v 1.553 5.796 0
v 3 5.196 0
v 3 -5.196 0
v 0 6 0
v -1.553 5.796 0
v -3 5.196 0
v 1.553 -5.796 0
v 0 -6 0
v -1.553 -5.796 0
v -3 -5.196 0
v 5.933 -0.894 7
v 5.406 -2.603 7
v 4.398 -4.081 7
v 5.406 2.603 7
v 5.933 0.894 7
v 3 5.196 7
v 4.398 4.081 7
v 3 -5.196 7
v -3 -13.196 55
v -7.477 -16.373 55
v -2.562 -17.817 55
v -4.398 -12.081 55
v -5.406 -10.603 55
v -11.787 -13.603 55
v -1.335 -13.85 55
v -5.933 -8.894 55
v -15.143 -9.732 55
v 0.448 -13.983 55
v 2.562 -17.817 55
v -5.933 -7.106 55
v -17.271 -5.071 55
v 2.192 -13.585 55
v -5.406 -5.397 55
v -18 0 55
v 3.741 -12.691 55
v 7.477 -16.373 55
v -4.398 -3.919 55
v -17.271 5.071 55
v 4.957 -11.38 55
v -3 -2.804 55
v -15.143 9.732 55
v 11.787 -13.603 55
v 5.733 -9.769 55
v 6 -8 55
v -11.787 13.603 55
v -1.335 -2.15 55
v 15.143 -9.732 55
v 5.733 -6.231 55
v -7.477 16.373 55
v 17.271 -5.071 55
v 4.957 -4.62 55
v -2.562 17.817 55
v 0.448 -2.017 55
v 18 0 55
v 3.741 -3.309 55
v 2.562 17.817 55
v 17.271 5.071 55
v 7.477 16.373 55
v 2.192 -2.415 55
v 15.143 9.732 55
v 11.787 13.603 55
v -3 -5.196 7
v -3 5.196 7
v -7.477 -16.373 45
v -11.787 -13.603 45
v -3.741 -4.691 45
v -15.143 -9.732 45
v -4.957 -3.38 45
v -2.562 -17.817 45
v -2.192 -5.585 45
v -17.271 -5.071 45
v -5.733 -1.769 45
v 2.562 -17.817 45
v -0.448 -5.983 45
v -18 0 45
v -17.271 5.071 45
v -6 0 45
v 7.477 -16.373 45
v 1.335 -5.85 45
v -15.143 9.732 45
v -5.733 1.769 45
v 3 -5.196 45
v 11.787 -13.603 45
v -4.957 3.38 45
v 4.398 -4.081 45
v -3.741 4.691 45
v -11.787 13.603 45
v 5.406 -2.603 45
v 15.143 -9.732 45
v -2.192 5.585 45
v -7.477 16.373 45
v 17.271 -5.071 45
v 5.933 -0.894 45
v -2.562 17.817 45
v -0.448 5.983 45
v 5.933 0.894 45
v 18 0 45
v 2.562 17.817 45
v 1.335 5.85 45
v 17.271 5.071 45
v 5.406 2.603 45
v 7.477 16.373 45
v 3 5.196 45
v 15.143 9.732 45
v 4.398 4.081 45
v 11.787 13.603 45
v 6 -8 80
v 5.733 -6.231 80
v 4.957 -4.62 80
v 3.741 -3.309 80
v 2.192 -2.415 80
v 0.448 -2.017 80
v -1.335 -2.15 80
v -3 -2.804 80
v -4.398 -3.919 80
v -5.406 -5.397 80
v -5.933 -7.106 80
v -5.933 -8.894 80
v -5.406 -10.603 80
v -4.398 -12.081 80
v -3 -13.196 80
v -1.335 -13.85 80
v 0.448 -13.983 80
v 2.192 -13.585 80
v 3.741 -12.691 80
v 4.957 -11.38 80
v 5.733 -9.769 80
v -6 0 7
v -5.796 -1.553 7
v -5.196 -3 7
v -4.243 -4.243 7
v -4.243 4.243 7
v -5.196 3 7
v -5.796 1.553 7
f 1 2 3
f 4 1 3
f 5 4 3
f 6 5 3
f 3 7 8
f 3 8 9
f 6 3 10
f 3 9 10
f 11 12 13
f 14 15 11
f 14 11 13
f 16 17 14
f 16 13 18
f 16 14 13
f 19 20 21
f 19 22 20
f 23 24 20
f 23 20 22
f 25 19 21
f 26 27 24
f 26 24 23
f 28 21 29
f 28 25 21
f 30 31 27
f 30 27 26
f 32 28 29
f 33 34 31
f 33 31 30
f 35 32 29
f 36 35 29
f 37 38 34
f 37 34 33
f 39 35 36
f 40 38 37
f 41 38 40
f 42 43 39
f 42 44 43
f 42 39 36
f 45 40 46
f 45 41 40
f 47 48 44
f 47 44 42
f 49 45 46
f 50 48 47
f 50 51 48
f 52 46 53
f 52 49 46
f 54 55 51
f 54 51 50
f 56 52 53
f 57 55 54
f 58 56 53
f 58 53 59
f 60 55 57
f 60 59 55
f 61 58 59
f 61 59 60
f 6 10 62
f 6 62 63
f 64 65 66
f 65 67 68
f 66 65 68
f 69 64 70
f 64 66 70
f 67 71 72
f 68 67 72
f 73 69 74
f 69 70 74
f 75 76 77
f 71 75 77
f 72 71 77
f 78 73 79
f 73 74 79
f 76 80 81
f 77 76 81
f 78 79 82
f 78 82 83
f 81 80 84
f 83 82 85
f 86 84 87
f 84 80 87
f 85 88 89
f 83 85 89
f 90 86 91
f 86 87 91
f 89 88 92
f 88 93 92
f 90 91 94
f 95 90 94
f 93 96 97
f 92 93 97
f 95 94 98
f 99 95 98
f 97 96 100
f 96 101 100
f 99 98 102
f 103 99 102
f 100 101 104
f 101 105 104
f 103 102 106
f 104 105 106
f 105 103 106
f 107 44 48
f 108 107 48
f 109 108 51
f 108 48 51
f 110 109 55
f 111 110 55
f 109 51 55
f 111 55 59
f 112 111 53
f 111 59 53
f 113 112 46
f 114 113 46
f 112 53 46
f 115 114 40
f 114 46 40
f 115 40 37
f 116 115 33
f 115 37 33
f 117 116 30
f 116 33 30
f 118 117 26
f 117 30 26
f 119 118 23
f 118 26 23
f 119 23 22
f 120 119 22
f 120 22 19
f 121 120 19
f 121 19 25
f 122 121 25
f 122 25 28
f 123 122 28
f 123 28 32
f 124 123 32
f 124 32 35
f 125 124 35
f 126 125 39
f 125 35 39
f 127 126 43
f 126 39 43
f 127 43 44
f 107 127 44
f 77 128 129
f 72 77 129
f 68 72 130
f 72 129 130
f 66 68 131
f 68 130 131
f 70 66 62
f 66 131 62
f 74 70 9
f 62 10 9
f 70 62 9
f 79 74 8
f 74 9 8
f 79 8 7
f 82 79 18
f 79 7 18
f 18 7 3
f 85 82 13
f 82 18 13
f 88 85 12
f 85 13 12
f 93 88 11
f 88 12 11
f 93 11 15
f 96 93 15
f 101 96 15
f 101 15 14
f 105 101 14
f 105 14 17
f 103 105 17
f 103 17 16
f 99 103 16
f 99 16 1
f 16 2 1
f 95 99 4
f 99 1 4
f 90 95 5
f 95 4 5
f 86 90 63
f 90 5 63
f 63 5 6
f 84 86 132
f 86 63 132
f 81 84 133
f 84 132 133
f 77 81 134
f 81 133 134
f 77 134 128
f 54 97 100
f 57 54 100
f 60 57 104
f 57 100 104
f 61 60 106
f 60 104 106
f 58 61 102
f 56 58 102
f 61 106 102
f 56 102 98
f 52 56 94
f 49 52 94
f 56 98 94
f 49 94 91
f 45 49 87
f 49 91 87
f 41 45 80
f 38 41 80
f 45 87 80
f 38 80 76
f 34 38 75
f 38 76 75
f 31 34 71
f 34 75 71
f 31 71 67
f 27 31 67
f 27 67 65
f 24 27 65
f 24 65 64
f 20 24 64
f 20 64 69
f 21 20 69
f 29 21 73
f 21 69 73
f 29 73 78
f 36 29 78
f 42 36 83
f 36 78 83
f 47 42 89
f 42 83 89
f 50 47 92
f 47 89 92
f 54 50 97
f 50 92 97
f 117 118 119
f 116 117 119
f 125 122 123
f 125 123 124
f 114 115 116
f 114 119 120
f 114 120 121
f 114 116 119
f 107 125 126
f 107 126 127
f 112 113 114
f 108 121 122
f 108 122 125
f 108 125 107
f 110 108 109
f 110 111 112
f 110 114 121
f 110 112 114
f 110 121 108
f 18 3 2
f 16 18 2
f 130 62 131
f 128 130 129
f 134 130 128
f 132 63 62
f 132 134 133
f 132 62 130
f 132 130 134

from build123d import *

# Parameters (mm, degrees)
ESBO_O1_R                = 6
RESSALTO_EXTRUS_O1_DEPTH = 45
ESBO_O2_R                = 18
RESSALTO_EXTRUS_O2_DEPTH = 10
ESBO_O3_R                = 6
RESSALTO_EXTRUS_O3_DEPTH = 25
ESBO_O4_W                = 4.529625907
ESBO_O4_H                = 11.468627296
ESBO_O4_W_2              = 6.059251814
ESBO_O4_H_2              = 15.612753126
CORTE_EXTRUS_O1_DEPTH    = 7


with BuildPart() as part:
    # Esboço1 → Ressalto-extrusão1 (new body)
    with BuildSketch(Plane.XY):
        with Locations(Location((0, 0, 0), (0, 0, 180))):
            Circle(ESBO_O1_R)
    extrude(amount=RESSALTO_EXTRUS_O1_DEPTH)

    # Esboço2 → Ressalto-extrusão2 (add)
    with BuildSketch(Plane.XY.offset(45)):
        Circle(ESBO_O2_R)
    extrude(amount=RESSALTO_EXTRUS_O2_DEPTH)

    # Esboço3 → Ressalto-extrusão3 (add)
    with BuildSketch(Plane.XY.offset(55)):
        with Locations((0, -8)):
            Circle(ESBO_O3_R)
    extrude(amount=RESSALTO_EXTRUS_O3_DEPTH)

    # Esboço4 → Corte-extrusão1 (cut)
    with BuildSketch(Plane(origin=(0, 0, 0), x_dir=(-1, 0, 0), z_dir=(0, 0, -1))):
        with Locations((-5.264812953, -0.433687587)):
            Rectangle(ESBO_O4_W, ESBO_O4_H)
        with Locations((6.029625907, -0.674625135)):
            Rectangle(ESBO_O4_W_2, ESBO_O4_H_2)
    extrude(amount=-CORTE_EXTRUS_O1_DEPTH, mode=Mode.SUBTRACT)


solid = part.part
